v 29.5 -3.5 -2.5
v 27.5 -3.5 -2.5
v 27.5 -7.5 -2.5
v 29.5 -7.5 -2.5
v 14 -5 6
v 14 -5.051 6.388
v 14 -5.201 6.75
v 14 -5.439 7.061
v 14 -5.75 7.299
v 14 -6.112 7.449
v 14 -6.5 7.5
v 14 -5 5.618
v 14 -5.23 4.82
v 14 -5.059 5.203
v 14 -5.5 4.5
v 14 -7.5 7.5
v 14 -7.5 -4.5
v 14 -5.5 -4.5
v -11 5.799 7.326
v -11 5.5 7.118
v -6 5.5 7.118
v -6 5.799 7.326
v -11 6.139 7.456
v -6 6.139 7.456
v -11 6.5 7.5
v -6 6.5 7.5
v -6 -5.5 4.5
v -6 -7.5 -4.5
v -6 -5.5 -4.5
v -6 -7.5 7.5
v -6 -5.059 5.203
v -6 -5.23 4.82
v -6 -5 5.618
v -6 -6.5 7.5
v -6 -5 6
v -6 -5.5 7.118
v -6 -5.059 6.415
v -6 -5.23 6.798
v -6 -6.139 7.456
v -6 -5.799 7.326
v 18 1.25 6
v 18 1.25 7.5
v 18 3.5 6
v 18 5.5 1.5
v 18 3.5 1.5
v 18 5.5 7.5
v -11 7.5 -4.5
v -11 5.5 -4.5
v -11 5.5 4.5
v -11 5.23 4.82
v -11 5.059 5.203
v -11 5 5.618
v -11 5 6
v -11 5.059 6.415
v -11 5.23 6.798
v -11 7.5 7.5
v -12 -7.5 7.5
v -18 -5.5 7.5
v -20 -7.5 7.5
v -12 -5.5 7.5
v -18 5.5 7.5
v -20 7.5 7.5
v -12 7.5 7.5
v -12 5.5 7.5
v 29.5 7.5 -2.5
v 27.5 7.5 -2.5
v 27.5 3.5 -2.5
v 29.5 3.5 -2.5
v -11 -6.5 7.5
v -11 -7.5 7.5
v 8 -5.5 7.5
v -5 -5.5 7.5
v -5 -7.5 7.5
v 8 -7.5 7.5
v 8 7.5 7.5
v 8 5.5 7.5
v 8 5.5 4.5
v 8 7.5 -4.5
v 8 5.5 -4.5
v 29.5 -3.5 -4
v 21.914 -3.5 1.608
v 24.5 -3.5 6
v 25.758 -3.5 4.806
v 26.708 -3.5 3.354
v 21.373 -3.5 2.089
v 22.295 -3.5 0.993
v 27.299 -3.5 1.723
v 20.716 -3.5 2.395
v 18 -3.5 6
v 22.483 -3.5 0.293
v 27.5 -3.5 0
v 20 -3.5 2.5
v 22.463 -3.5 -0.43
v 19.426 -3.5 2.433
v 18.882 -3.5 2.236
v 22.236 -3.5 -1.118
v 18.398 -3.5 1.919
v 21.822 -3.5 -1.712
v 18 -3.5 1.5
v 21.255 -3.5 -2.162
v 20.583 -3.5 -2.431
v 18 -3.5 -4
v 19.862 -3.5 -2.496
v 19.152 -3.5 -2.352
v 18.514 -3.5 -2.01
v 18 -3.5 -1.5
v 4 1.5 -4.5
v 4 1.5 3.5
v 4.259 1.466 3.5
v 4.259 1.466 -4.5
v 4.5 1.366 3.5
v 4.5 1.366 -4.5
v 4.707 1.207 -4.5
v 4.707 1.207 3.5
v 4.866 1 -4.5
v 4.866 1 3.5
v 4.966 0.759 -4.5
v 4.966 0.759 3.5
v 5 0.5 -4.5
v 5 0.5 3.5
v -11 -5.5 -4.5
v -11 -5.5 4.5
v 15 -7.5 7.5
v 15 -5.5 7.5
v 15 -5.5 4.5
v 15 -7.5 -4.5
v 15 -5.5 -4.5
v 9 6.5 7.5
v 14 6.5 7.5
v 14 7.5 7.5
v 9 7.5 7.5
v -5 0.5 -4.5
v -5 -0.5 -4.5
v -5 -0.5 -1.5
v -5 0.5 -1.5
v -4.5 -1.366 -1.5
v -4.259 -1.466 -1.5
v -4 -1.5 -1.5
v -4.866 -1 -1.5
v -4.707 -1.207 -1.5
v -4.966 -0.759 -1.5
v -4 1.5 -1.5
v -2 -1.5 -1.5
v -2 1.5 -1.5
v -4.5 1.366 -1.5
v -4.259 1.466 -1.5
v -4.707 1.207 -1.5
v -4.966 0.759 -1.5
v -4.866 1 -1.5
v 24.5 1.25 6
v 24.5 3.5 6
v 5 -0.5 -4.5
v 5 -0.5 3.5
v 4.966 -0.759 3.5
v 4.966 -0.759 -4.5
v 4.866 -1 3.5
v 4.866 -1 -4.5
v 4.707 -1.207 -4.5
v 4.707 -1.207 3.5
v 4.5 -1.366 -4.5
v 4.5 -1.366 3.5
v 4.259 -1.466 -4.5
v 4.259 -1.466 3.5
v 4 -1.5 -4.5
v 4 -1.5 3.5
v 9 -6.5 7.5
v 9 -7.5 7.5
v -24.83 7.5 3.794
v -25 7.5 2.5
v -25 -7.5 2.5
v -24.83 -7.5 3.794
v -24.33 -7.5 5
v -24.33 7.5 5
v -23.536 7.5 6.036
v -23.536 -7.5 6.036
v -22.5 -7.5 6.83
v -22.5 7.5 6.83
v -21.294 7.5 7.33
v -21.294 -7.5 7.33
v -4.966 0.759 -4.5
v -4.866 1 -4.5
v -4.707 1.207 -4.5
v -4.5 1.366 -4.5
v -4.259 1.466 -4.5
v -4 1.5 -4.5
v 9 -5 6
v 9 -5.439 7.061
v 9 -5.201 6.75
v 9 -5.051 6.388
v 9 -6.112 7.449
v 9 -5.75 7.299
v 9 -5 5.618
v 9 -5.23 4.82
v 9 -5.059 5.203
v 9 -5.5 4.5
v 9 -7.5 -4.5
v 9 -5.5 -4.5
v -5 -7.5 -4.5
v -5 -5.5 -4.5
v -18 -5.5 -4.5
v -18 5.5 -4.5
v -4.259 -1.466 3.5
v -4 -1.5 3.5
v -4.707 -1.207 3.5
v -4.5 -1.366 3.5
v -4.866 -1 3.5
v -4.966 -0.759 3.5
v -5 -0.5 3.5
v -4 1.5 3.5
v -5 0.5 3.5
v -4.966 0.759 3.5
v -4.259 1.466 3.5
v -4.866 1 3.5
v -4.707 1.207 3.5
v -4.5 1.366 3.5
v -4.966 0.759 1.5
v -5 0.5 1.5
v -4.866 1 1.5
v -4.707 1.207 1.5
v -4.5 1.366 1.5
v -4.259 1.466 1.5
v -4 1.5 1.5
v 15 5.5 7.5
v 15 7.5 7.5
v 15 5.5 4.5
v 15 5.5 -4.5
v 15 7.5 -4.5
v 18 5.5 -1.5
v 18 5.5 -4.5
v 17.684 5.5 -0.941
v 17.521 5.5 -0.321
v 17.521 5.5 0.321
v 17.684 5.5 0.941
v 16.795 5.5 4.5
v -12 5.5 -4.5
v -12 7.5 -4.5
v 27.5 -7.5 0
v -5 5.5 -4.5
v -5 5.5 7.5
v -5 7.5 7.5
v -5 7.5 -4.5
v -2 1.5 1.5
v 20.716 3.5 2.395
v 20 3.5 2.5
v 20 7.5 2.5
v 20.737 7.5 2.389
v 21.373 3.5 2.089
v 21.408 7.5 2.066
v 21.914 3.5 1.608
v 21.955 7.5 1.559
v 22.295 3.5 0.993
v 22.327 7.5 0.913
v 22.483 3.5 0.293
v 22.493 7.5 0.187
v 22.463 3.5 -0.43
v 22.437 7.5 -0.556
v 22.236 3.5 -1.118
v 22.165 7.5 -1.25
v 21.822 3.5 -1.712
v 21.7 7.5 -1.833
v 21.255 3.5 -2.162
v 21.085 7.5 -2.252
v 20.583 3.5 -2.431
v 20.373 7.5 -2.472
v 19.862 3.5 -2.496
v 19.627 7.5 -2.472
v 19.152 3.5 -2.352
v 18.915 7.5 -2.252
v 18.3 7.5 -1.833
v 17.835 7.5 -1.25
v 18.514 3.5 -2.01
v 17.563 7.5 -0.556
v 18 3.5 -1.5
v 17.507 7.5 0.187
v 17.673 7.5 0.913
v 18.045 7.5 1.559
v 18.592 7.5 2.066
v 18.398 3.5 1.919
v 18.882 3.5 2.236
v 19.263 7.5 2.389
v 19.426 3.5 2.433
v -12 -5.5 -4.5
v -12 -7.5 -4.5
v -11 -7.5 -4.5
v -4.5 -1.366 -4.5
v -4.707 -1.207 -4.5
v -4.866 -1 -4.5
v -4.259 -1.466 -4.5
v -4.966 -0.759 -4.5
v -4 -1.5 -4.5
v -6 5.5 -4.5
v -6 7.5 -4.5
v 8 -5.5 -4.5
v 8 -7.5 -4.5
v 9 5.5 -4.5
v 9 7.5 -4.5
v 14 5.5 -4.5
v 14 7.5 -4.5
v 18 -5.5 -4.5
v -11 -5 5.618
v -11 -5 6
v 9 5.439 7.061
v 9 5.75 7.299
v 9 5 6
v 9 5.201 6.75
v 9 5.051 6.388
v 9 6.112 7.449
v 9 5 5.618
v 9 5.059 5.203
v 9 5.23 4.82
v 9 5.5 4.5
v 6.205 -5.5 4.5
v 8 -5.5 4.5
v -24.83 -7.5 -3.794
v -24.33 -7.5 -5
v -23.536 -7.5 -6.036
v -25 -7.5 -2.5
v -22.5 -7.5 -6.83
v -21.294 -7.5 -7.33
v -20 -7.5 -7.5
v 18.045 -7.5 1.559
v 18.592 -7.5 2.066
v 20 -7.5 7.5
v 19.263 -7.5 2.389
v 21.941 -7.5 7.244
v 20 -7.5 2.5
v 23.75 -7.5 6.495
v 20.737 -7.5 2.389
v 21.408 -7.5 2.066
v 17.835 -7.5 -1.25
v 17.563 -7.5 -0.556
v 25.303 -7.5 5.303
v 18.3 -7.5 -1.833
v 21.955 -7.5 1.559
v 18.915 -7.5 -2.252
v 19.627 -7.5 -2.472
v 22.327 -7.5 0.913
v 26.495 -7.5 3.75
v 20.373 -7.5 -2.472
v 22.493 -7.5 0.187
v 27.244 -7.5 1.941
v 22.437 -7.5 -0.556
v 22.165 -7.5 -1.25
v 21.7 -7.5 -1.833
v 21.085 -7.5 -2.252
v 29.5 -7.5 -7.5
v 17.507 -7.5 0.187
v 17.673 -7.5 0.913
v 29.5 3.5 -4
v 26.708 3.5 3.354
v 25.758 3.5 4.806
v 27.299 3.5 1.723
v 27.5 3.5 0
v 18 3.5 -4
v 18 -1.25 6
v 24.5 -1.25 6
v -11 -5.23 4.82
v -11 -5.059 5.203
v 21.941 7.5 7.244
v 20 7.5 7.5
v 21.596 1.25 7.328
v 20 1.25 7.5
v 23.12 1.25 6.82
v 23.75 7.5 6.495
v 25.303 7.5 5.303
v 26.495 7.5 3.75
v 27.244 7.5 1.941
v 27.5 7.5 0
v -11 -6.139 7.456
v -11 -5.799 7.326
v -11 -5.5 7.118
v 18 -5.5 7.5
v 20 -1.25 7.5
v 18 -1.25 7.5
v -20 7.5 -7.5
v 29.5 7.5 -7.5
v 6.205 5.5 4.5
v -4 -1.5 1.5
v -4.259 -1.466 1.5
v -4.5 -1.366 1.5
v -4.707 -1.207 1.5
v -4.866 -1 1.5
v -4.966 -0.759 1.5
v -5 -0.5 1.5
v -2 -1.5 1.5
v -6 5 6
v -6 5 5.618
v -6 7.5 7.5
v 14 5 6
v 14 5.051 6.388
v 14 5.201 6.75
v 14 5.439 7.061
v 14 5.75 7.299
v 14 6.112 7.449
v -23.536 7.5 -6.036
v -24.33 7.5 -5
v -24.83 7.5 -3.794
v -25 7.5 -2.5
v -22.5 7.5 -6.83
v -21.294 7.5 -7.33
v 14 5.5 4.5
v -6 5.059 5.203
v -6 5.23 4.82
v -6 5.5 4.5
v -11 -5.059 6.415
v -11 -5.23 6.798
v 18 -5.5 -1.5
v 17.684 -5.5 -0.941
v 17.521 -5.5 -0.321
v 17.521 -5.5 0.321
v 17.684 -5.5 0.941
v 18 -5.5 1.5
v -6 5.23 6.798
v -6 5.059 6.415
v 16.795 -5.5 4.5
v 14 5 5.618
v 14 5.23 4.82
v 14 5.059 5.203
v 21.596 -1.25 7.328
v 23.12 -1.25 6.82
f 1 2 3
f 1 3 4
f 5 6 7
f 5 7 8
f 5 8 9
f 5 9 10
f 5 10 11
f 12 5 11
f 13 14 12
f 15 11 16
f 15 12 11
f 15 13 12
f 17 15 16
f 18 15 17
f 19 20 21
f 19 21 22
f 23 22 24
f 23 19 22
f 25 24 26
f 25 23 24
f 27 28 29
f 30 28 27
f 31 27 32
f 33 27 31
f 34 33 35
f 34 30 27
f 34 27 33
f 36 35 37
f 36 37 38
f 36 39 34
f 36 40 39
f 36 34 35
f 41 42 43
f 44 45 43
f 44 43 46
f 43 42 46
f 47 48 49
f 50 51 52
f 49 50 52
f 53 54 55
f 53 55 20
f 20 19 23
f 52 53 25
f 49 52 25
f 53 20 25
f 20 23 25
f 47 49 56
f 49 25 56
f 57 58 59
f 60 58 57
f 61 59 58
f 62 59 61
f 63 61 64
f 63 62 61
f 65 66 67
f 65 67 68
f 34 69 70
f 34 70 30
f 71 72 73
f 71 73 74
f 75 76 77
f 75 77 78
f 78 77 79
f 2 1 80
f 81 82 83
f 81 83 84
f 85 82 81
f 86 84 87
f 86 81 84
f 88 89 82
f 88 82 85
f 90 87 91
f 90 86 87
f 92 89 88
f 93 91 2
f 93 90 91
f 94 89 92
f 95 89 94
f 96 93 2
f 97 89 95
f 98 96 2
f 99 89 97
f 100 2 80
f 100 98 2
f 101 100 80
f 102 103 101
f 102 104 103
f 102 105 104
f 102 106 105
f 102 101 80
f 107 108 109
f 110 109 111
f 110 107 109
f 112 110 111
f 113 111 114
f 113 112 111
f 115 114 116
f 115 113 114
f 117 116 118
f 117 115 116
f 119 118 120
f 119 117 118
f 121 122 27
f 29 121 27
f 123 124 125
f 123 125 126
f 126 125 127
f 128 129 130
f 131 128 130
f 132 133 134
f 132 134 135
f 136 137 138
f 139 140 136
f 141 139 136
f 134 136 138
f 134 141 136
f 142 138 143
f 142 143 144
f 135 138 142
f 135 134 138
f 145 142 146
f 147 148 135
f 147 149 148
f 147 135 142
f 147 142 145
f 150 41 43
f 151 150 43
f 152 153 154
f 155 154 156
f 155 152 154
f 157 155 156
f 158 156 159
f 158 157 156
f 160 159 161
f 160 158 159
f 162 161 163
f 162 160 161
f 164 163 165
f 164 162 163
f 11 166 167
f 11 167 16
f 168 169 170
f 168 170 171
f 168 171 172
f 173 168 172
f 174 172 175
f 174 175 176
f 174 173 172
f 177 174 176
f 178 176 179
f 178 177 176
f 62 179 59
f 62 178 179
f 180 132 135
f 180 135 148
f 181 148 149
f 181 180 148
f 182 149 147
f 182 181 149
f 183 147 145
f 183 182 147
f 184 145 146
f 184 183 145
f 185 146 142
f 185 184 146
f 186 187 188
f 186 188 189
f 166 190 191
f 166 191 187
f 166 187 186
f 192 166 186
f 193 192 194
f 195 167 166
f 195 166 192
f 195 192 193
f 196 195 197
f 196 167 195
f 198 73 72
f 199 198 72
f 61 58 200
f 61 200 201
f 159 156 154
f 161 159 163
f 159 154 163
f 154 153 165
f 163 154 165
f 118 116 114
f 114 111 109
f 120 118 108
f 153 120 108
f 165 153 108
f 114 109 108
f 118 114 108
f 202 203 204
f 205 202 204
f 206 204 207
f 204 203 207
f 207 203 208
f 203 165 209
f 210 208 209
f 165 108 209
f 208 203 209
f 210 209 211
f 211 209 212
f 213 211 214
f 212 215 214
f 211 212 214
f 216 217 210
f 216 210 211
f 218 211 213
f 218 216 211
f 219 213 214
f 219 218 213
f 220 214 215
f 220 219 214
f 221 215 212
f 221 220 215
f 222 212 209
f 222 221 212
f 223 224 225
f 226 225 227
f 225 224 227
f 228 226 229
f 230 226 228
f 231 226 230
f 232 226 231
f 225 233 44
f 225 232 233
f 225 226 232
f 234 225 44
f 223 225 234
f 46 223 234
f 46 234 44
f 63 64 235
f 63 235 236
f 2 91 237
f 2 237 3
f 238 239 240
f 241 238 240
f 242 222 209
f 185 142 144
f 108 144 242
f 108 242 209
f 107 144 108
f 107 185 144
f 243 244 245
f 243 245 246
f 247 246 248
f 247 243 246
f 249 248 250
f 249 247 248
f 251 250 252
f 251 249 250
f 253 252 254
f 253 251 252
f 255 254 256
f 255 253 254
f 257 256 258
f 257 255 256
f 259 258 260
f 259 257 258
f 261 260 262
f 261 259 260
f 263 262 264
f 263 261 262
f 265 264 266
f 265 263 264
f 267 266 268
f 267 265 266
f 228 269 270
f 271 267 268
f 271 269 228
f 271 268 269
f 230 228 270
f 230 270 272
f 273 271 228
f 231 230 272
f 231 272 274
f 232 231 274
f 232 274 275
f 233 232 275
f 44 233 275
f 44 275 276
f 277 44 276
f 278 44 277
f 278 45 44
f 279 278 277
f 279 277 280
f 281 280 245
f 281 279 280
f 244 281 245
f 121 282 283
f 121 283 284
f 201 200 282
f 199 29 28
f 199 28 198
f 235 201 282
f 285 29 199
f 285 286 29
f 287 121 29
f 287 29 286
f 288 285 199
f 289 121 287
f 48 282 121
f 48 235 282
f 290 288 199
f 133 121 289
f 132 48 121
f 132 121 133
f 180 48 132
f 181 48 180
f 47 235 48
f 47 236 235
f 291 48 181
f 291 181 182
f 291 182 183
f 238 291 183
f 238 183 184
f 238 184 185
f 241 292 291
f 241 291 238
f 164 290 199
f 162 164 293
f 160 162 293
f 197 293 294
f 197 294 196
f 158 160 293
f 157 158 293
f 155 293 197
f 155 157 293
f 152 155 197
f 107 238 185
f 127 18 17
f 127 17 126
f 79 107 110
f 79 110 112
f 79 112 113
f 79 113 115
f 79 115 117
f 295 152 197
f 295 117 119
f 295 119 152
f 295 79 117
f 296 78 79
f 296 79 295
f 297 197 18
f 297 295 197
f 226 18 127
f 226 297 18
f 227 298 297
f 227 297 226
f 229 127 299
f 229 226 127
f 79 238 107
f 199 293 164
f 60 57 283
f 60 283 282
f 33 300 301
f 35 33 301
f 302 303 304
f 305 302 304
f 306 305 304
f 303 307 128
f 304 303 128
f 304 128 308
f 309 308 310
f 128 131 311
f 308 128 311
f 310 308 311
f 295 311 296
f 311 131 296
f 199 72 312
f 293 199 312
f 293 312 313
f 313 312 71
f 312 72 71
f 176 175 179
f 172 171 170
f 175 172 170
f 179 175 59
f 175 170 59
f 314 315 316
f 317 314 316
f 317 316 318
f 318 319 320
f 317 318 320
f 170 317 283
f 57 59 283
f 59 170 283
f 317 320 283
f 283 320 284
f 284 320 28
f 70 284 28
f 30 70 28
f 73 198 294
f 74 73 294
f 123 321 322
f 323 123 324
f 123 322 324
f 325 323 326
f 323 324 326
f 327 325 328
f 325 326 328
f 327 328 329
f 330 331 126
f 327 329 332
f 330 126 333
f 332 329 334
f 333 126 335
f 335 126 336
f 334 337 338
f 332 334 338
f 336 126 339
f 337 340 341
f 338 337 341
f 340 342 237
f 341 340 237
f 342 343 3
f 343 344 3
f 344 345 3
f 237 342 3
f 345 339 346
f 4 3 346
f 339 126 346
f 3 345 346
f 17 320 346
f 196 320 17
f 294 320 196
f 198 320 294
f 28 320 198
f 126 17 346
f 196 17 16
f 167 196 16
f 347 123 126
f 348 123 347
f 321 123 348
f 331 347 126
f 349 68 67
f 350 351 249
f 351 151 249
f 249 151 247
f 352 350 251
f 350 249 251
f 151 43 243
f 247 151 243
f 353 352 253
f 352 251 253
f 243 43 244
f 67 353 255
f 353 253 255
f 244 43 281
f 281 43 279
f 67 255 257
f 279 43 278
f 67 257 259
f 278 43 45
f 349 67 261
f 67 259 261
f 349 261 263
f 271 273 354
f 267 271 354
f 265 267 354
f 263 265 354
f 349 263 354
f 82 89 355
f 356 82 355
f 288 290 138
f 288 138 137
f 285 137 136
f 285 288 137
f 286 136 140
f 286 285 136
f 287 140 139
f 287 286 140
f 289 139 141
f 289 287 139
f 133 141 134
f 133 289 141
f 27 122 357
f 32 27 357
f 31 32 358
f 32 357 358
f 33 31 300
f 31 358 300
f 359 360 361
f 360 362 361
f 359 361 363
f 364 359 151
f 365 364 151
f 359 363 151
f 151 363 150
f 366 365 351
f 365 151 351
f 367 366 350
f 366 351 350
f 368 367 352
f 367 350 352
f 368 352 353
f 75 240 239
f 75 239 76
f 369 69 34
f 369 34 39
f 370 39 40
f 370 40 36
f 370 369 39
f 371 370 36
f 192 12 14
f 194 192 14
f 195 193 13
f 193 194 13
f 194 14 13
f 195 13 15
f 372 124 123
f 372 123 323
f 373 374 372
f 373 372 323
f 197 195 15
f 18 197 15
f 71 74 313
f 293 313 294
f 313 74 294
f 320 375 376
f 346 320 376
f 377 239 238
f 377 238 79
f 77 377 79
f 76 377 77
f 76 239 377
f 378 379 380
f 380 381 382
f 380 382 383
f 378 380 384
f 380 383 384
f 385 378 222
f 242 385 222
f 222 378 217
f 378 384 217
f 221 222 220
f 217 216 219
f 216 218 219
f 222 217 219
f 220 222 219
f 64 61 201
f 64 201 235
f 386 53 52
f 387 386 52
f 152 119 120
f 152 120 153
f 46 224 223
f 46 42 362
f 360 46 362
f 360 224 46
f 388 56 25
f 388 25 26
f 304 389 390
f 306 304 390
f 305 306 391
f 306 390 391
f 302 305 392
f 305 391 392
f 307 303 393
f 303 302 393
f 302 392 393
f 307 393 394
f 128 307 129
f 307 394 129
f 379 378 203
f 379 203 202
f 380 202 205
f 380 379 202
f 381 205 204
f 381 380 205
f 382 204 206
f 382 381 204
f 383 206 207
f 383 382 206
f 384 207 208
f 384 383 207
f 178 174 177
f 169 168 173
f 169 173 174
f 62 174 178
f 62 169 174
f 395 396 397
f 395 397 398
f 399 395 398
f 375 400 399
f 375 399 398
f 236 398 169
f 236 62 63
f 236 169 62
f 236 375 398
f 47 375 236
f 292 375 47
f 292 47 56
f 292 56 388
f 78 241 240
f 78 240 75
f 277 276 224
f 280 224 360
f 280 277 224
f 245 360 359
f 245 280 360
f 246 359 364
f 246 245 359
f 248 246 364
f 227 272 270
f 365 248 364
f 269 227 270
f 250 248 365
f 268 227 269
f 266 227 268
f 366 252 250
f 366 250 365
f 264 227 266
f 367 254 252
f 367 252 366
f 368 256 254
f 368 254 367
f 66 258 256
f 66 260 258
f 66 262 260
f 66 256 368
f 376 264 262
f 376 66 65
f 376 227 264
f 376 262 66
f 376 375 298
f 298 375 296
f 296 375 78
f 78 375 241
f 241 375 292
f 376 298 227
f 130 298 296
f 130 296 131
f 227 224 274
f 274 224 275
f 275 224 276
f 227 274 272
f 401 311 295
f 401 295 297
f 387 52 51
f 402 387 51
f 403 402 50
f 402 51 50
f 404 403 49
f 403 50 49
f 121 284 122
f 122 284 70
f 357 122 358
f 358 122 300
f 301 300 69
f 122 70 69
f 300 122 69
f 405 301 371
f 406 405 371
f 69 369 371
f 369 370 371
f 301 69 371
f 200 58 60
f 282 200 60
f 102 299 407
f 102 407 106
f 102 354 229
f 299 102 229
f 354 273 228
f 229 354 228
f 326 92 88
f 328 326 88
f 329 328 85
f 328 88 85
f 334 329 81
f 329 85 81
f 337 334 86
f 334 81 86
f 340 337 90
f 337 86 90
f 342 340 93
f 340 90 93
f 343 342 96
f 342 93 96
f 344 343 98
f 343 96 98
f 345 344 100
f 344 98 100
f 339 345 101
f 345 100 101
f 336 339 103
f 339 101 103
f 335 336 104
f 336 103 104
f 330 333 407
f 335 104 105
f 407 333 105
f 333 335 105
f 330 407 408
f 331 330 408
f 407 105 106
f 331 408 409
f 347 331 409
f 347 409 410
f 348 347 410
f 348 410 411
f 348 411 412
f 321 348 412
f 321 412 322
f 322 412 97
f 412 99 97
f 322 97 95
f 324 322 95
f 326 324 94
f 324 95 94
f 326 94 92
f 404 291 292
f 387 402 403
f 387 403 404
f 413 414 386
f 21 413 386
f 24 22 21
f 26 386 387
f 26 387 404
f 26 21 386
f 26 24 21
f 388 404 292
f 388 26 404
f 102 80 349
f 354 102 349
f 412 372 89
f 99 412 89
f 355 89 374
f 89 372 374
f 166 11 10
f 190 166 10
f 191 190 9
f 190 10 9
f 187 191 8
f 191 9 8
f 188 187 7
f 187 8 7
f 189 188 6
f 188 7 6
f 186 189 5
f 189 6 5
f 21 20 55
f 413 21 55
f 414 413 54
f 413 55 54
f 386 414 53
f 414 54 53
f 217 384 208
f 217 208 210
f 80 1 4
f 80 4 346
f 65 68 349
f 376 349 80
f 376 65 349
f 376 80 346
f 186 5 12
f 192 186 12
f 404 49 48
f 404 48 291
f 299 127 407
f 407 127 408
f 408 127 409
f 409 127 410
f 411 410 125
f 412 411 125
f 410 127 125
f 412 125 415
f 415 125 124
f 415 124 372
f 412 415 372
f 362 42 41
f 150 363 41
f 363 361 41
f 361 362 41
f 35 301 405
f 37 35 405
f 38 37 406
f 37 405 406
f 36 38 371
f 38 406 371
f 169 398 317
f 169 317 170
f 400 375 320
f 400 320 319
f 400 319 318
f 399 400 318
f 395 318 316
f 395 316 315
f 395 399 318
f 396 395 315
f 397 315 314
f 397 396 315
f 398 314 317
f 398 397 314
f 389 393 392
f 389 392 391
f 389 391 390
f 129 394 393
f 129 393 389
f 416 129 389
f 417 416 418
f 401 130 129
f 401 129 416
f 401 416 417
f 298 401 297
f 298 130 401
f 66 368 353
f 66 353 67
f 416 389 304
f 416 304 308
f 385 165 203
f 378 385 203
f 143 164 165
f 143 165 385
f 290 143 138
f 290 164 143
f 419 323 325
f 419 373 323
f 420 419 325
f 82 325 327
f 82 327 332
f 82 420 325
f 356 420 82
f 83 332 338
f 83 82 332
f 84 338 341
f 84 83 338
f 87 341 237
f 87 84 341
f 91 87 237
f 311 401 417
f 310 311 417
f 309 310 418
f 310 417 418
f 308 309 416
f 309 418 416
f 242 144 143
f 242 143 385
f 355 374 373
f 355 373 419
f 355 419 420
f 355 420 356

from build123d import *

# Parameters (mm, degrees)
SKETCH1_R             = 7.5
SKETCH1_R_2           = 2.5
SKETCH1_W             = 2
SKETCH1_H             = 5
BOSS_EXTRUDE1_DEPTH   = 7.5
CUT_EXTRUDE1_START    = 7.5
SKETCH2_W             = 36
SKETCH2_H             = 11
CUT_EXTRUDE1_DEPTH    = 12
SKETCH3_W             = 1.5
SKETCH3_H             = 2.5
SKETCH3_W_2           = 10
SKETCH3_H_2           = 7
CUT_EXTRUDE2_DEPTH    = 40
SKETCH5_W             = 1
SKETCH5_H             = 12
CUT_EXTRUDE3_DEPTH    = 20
BOSS_EXTRUDE2_START   = 14
SKETCH6_W             = 3
SKETCH6_H             = 0.5
BOSS_EXTRUDE2_DEPTH   = 5
FILLET2_R             = 1.5
LPATTERN4_START       = -12
LPATTERN4_OUTLINE_W   = 2
LPATTERN4_OUTLINE_H   = 12
LPATTERN4_DEPTH       = 1
LPATTERN4_START_2     = -6
LPATTERN4_2_OUTLINE_W = 2
LPATTERN4_2_OUTLINE_H = 12
LPATTERN4_2_DEPTH     = 1
LPATTERN4_START_3     = -11
LPATTERN4_3_DEPTH     = 5
LPATTERN4_4_DEPTH     = 5
BOSS_EXTRUDE3_START   = -4.5
BOSS_EXTRUDE3_DEPTH   = 8
SKETCH8_W             = 3
SKETCH8_H             = 4
CUT_EXTRUDE4_DEPTH    = 3


# Read off the part's stored shape, not the designer's step: LPattern4
with BuildPart() as part:
    # Sketch1 → Boss-Extrude1 (new, symmetric)
    # profile 1 of 4: a face of its own
    with BuildSketch(Plane(origin=(0, 0, 0), x_dir=(1, 0, 0), z_dir=(0, 1, 0))):
        with BuildLine():
            ThreePointArc((20, -7.5), (12.5, 0), (20, 7.5))
            Line((20, 7.5), (-20, 7.5))
            ThreePointArc((-20, 7.5), (-23.535533906, 6.035533906), (-25, 2.5))
            Line((-25, 2.5), (-25, -2.5))
            ThreePointArc((-25, -2.5), (-23.535533906, -6.035533906), (-20, -7.5))
            Line((-20, -7.5), (20, -7.5))
        make_face()
    # profile 2 of 4: a face of its own
    with BuildSketch(Plane(origin=(0, 0, 0), x_dir=(1, 0, 0), z_dir=(0, 1, 0))):
        with Locations((20, 0)):
            Circle(SKETCH1_R)
        with Locations(Location((20, 0, 0), (0, 0, 270))):
            Circle(SKETCH1_R_2, mode=Mode.SUBTRACT)
    # profile 3 of 4: a face of its own
    with BuildSketch(Plane(origin=(0, 0, 0), x_dir=(1, 0, 0), z_dir=(0, 1, 0))):
        with BuildLine():
            Line((27.5, 2.5), (27.5, 7.5))
            Line((27.5, 7.5), (20, 7.5))
            ThreePointArc((20, 7.5), (25.303300859, 5.303300859), (27.5, 0))
            Line((27.5, 0), (27.5, 2.5))
        make_face()
    # profile 4 of 4: a face of its own
    with BuildSketch(Plane(origin=(0, 0, 0), x_dir=(1, 0, 0), z_dir=(0, 1, 0))):
        with Locations((28.5, 5)):
            Rectangle(SKETCH1_W, SKETCH1_H)
    extrude(amount=BOSS_EXTRUDE1_DEPTH, both=True)

    # Sketch2 → Cut-Extrude1 (cut)
    with BuildSketch(Plane.XY.offset(CUT_EXTRUDE1_START)):
        Rectangle(SKETCH2_W, SKETCH2_H)
    extrude(amount=-CUT_EXTRUDE1_DEPTH, mode=Mode.SUBTRACT)

    # Sketch3 → Cut-Extrude2 (cut)
    with BuildSketch(Plane(origin=(0, 0, 0), x_dir=(0, 0, -1), z_dir=(1, 0, 0))):
        with Locations((-6.75, 0)):
            Rectangle(SKETCH3_W, SKETCH3_H)
        with Locations((-1, 0)):
            Rectangle(SKETCH3_W_2, SKETCH3_H_2)
    extrude(amount=CUT_EXTRUDE2_DEPTH, mode=Mode.SUBTRACT)

    # Sketch5 → Cut-Extrude3 (cut, symmetric)
    with BuildSketch(Plane(origin=(0, 0, 0), x_dir=(1, 0, 0), z_dir=(0, 1, 0))):
        with Locations((8.5, -1.5)):
            Rectangle(SKETCH5_W, SKETCH5_H)
        with Locations((14.5, -1.5)):
            Rectangle(SKETCH5_W, SKETCH5_H)
    extrude(amount=CUT_EXTRUDE3_DEPTH, both=True, mode=Mode.SUBTRACT)

    # Sketch6 → Boss-Extrude2 (add)
    with BuildSketch(Plane(origin=(0, 0, 0), x_dir=(0, 0, -1), z_dir=(1, 0, 0)).offset(BOSS_EXTRUDE2_START)):
        with Locations((-6, 5.25)):
            Rectangle(SKETCH6_W, SKETCH6_H)
        with Locations((-6, -5.25)):
            Rectangle(SKETCH6_W, SKETCH6_H)
    extrude(amount=-BOSS_EXTRUDE2_DEPTH)

    # Fillet2
    # the kernel refuses this fillet: 1.5 mm, written as the material it takes off along each edge
    with BuildSketch(Plane(origin=(16.795084972, 5, 4.5), x_dir=(0, 0, 1), z_dir=(-1, 0, 0))) as fillet2_piece_1:
        with BuildLine():
            CenterArc((1.118033989, 1.5), FILLET2_R, 221.810314896, 48.189685104)
            Line((0, 0.5), (0, 0))
            Line((0, 0), (1.118033989, 0))
        make_face()
    extrude(amount=10.590169944, mode=Mode.SUBTRACT)
    with BuildSketch(Plane(origin=(17.75, 5, 7.5), x_dir=(0, 1, 0), z_dir=(-1, 0, 0))) as fillet2_piece_2_section:
        with BuildLine():
            CenterArc((FILLET2_R, FILLET2_R), FILLET2_R, 180, 90)
            Line((0, FILLET2_R), (0, 0))
            Line((0, 0), (FILLET2_R, 0))
        make_face()
    fillet2_piece_2 = extrude(amount=12.5, mode=Mode.PRIVATE)
    fillet2_piece_2 = split(fillet2_piece_2, bisect_by=Plane(origin=(15, 5.743185978, 7.388433108), z_dir=(-1, 0, 0)), keep=Keep.TOP, mode=Mode.PRIVATE)
    fillet2_piece_2 = split(fillet2_piece_2, bisect_by=Plane(origin=(8, 5.743185978, 7.388433108), z_dir=(1, 0, 0)), keep=Keep.TOP, mode=Mode.PRIVATE)
    add(fillet2_piece_2, mode=Mode.SUBTRACT)
    with BuildSketch(Plane(origin=(16.795084972, -5, 4.5), x_dir=(0, 0, 1), z_dir=(-1, 0, 0))) as fillet2_piece_3:
        with BuildLine():
            CenterArc((1.118033989, -1.5), FILLET2_R, 90, 48.189685104)
            Line((0, -0.5), (0, 0))
            Line((0, 0), (1.118033989, 0))
        make_face()
    extrude(amount=10.590169944, mode=Mode.SUBTRACT)
    with BuildSketch(Plane(origin=(17.75, -5, 7.5), x_dir=(0, -1, 0), z_dir=(-1, 0, 0))) as fillet2_piece_4_section:
        with BuildLine():
            CenterArc((FILLET2_R, -FILLET2_R), FILLET2_R, 90, 90)
            Line((0, -FILLET2_R), (0, 0))
            Line((0, 0), (FILLET2_R, 0))
        make_face()
    fillet2_piece_4 = extrude(amount=8.75, mode=Mode.PRIVATE)
    fillet2_piece_4 = split(fillet2_piece_4, bisect_by=Plane(origin=(15, -5.743185978, 7.388433108), z_dir=(-1, 0, 0)), keep=Keep.TOP, mode=Mode.PRIVATE)
    add(fillet2_piece_4, mode=Mode.SUBTRACT)

    # LPattern4 outline → LPattern4 (cut)
    with BuildSketch(Plane.YZ.offset(LPATTERN4_START)):
        with Locations((-6.5, 1.5)):
            Rectangle(LPATTERN4_OUTLINE_W, LPATTERN4_OUTLINE_H)
        with Locations((6.5, 1.5)):
            Rectangle(LPATTERN4_OUTLINE_W, LPATTERN4_OUTLINE_H)
    extrude(amount=LPATTERN4_DEPTH, mode=Mode.SUBTRACT)

    # LPattern4 2 outline → LPattern4 2 (cut)
    with BuildSketch(Plane.YZ.offset(LPATTERN4_START_2)):
        with Locations((-6.5, 1.5)):
            Rectangle(LPATTERN4_2_OUTLINE_W, LPATTERN4_2_OUTLINE_H)
        with Locations((6.5, 1.5)):
            Rectangle(LPATTERN4_2_OUTLINE_W, LPATTERN4_2_OUTLINE_H)
    extrude(amount=LPATTERN4_2_DEPTH, mode=Mode.SUBTRACT)

    # LPattern4 3 outline → LPattern4 3 (cut)
    with BuildSketch(Plane.YZ.offset(LPATTERN4_START_3)):
        with BuildLine():
            ThreePointArc((-6.5, 7.5), (-5.964766865, 7.401258539), (-5.5, 7.118033989))
            Line((-5.5, 7.118033989), (-5.5, 7.5))
            Line((-5.5, 7.5), (-6.5, 7.5))
        make_face()
        with BuildLine():
            Line((6.5, 7.5), (5.5, 7.5))
            Line((5.5, 7.5), (5.5, 7.118033989))
            ThreePointArc((5.5, 7.118033989), (5.964766865, 7.401258539), (6.5, 7.5))
        make_face()
    extrude(amount=LPATTERN4_3_DEPTH, mode=Mode.SUBTRACT)

    # LPattern4 4 outline → LPattern4 4 (add)
    with BuildSketch(Plane.YZ.offset(LPATTERN4_START_3)):
        with BuildLine():
            Line((-5, 5.618033989), (-5, 6))
            ThreePointArc((-5, 6), (-5.130693606, 6.612372436), (-5.5, 7.118033989))
            Line((-5.5, 7.118033989), (-5.5, 4.5))
            ThreePointArc((-5.5, 4.5), (-5.130693606, 5.005661553), (-5, 5.618033989))
        make_face()
        with BuildLine():
            Line((5.5, 4.5), (5.5, 7.118033989))
            ThreePointArc((5.5, 7.118033989), (5.130693606, 6.612372436), (5, 6))
            Line((5, 6), (5, 5.618033989))
            ThreePointArc((5, 5.618033989), (5.130693606, 5.005661553), (5.5, 4.5))
        make_face()
    extrude(amount=LPATTERN4_4_DEPTH)

    # Sketch7 → Boss-Extrude3 (add)
    with BuildSketch(Plane.XY.offset(BOSS_EXTRUDE3_START)):
        with BuildLine():
            Line((4, -1.5), (-4, -1.5))
            ThreePointArc((-4, -1.5), (-4.707106781, -1.207106781), (-5, -0.5))
            Line((-5, -0.5), (-5, 0.5))
            ThreePointArc((-5, 0.5), (-4.707106781, 1.207106781), (-4, 1.5))
            Line((-4, 1.5), (4, 1.5))
            ThreePointArc((4, 1.5), (4.707106781, 1.207106781), (5, 0.5))
            Line((5, 0.5), (5, -0.5))
            ThreePointArc((5, -0.5), (4.707106781, -1.207106781), (4, -1.5))
        make_face()
    extrude(amount=BOSS_EXTRUDE3_DEPTH)

    # Sketch8 → Cut-Extrude4 (cut)
    with BuildSketch(Plane.ZY.offset(5)):
        Rectangle(SKETCH8_W, SKETCH8_H)
    extrude(amount=-CUT_EXTRUDE4_DEPTH, mode=Mode.SUBTRACT)


solid = part.part
